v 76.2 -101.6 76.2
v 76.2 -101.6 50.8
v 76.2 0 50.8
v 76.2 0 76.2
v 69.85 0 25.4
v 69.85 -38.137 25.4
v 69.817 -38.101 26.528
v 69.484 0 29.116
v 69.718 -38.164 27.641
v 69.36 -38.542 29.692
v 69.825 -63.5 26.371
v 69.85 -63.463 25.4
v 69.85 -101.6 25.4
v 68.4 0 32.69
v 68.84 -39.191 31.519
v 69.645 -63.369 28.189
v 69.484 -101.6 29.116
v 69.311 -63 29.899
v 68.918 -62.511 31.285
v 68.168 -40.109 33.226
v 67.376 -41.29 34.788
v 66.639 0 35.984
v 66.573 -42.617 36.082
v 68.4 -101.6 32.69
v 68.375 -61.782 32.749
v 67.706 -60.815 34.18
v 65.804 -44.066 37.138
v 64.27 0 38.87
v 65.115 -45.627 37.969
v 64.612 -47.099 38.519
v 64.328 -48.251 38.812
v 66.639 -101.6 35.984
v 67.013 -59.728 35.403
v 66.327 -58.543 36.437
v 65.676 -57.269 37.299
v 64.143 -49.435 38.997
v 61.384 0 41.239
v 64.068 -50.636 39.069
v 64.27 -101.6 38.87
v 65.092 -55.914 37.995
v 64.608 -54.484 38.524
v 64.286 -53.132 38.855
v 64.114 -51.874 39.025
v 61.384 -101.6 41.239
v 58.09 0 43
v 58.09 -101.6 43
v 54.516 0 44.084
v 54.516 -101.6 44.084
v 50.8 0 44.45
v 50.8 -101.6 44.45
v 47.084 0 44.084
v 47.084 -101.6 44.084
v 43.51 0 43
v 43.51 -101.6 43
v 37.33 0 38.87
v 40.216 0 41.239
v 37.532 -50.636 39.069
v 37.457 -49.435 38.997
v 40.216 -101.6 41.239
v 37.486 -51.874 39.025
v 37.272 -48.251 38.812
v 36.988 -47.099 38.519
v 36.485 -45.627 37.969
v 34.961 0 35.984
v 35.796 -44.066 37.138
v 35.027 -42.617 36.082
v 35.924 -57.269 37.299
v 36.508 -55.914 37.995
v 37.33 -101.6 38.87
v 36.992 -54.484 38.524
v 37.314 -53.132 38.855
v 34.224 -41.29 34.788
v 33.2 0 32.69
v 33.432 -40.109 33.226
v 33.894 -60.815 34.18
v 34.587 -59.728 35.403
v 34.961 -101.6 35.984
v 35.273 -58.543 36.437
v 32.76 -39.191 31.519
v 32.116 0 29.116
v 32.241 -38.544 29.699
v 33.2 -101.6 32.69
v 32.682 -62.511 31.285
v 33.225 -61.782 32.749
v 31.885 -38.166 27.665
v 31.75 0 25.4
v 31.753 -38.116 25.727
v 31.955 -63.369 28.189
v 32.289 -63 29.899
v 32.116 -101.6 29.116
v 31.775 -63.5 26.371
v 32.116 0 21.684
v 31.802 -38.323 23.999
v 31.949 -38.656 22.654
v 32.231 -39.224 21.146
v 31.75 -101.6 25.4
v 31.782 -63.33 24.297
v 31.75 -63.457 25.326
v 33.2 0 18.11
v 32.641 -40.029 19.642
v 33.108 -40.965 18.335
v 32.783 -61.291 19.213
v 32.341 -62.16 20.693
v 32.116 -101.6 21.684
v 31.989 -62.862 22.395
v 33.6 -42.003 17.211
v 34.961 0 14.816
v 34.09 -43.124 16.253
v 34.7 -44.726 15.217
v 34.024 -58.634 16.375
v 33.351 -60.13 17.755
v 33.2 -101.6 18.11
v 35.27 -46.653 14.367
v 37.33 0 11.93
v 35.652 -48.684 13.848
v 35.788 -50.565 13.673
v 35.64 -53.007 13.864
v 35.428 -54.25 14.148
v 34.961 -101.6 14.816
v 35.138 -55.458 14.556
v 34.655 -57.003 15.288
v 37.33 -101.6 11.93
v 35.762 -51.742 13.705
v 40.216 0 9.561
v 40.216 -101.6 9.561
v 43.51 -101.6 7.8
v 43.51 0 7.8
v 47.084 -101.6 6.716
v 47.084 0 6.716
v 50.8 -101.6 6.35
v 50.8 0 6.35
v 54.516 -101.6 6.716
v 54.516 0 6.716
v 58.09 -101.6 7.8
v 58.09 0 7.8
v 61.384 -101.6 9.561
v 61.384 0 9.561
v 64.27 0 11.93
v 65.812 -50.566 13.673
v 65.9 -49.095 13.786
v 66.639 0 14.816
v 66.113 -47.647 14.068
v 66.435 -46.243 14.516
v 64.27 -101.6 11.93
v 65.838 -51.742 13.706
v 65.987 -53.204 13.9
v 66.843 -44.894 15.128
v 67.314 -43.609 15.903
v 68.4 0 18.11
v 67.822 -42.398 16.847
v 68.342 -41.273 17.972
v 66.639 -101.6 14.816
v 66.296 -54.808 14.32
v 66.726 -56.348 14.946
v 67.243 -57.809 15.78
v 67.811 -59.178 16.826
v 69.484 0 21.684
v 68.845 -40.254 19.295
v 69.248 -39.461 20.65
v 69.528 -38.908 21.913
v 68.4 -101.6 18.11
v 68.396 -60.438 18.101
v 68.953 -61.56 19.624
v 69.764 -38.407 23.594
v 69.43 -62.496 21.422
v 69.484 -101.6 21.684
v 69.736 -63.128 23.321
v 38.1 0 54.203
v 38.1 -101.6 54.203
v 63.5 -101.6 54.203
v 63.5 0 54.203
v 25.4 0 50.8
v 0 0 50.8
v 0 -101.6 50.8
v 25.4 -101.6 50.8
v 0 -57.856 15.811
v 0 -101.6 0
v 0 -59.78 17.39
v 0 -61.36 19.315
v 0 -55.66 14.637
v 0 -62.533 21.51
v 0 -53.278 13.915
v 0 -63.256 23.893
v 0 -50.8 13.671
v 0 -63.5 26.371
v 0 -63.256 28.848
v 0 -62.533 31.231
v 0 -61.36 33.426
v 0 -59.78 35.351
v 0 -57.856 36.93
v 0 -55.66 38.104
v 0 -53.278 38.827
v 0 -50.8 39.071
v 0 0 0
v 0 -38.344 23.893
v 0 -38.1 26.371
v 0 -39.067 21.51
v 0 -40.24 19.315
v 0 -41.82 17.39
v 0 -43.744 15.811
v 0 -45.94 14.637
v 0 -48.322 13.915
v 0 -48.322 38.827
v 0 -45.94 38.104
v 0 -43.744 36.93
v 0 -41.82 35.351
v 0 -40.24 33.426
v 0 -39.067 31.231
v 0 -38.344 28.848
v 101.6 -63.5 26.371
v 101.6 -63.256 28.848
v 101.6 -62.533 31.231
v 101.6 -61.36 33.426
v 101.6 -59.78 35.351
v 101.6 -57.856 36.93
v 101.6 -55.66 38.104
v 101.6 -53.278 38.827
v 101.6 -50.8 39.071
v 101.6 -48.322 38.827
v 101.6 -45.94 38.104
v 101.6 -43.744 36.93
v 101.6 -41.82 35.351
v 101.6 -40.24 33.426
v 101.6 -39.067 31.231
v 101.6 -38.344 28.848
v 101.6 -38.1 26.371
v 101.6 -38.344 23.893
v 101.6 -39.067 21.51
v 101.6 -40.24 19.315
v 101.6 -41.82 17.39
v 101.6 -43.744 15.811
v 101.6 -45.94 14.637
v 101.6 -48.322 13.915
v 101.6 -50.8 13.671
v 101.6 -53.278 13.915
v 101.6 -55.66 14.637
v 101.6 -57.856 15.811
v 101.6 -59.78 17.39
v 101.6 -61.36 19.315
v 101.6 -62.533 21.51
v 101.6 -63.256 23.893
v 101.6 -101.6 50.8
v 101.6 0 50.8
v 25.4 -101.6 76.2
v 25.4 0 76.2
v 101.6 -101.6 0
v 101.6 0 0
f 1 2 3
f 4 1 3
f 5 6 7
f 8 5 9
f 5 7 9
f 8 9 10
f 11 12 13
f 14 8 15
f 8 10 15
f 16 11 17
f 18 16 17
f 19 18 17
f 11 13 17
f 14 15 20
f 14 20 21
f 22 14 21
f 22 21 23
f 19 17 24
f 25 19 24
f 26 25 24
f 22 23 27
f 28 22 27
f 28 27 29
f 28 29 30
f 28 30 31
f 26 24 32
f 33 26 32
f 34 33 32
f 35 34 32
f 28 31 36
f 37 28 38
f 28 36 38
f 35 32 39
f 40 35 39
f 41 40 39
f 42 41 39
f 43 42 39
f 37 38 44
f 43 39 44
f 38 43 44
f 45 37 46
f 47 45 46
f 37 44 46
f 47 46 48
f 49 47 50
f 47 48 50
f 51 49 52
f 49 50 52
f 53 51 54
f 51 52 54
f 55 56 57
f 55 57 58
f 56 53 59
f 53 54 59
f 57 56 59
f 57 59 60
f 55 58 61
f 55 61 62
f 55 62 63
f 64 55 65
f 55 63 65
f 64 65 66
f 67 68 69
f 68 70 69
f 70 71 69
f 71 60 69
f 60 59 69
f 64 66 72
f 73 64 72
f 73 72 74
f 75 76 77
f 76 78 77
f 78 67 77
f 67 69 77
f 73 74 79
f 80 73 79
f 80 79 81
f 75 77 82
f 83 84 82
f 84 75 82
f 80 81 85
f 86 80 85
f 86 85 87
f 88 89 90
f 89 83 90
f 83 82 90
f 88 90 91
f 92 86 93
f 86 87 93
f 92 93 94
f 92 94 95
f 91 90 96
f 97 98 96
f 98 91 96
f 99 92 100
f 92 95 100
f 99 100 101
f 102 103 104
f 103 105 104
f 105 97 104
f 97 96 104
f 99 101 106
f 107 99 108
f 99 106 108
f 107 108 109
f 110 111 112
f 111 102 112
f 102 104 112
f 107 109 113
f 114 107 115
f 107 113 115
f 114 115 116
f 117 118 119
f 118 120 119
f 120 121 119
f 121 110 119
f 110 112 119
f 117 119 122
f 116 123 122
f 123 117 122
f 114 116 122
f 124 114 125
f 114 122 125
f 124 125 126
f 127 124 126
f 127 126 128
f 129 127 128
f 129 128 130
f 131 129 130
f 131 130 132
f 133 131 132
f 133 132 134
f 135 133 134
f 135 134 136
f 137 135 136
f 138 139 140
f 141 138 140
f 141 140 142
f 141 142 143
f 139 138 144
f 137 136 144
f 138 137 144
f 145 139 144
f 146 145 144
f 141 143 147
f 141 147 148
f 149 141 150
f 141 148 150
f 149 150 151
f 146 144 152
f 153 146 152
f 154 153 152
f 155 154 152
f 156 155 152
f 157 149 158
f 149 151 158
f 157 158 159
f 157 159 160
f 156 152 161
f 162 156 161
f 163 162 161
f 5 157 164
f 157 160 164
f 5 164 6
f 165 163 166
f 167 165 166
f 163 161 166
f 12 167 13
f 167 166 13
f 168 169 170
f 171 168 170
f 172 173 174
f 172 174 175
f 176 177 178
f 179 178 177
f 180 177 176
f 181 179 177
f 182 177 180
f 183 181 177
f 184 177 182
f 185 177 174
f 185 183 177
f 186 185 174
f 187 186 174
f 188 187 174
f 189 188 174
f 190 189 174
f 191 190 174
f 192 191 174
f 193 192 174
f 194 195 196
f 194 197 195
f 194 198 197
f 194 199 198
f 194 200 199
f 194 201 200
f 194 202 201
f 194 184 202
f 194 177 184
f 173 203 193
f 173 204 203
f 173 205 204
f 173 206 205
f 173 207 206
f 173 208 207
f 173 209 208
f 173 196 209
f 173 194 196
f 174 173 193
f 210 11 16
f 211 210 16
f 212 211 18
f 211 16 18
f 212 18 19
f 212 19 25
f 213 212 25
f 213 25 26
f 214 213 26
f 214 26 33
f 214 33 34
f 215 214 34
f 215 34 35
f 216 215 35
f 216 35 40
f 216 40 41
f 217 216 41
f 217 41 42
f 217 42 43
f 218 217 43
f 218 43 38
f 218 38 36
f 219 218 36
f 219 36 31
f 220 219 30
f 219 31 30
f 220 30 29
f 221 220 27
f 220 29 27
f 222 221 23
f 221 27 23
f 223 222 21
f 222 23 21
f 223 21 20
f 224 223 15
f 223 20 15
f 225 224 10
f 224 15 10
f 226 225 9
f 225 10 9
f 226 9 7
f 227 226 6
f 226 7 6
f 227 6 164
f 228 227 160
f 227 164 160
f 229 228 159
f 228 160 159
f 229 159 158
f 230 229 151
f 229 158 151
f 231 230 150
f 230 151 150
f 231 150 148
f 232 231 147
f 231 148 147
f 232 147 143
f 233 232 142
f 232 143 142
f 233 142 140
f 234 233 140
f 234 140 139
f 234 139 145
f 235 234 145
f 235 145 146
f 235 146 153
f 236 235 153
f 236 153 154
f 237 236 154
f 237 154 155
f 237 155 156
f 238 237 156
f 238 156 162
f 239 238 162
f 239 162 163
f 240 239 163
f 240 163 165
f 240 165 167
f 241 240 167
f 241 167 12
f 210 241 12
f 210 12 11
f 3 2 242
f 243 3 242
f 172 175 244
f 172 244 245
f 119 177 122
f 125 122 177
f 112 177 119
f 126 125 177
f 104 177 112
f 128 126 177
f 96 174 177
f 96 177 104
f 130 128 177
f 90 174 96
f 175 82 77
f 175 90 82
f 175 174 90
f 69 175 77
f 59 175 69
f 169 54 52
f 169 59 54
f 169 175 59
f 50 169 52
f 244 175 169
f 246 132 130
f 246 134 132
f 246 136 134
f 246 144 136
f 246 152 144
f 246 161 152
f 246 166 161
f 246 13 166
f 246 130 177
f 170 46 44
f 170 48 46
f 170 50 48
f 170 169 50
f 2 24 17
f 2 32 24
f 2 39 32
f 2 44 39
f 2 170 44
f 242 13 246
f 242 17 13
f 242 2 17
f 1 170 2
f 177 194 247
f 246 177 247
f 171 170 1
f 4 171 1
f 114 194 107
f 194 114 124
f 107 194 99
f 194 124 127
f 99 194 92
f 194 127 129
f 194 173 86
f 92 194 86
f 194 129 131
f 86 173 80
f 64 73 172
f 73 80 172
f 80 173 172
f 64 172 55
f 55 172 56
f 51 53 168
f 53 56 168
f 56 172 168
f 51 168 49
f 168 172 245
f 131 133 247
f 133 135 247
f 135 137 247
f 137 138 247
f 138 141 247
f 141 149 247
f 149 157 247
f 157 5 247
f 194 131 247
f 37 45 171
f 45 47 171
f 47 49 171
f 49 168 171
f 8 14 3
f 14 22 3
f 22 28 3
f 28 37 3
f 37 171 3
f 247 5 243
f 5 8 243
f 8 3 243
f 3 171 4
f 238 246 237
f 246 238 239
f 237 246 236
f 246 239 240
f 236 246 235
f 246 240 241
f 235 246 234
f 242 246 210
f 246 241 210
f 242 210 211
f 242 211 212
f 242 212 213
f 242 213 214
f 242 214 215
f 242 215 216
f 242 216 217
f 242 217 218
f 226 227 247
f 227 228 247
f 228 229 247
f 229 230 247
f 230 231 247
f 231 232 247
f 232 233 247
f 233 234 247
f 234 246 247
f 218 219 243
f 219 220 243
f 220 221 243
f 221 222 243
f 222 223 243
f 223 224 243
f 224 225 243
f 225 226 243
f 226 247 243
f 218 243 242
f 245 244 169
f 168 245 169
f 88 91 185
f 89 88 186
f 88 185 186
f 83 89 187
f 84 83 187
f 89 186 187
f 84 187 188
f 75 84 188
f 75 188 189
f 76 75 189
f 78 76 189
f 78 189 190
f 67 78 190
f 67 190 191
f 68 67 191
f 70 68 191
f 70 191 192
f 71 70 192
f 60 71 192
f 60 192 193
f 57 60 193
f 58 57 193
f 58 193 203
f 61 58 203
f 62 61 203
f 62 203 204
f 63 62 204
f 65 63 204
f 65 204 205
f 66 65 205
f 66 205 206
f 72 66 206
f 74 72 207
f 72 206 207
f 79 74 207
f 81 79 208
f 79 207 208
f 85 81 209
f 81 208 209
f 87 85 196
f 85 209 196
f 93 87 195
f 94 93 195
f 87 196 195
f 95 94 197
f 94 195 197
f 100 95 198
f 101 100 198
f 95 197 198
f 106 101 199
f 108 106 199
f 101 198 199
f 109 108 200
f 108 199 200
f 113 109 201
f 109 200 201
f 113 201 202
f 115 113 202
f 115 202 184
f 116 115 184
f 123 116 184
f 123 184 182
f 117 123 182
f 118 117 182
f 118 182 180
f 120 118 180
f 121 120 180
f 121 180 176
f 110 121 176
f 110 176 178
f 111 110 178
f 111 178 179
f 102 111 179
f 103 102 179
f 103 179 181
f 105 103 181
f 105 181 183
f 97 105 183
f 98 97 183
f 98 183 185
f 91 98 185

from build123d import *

# Parameters (mm, degrees)
F0_W     = 101.6
F0_H     = 50.8
F1_DEPTH = 101.6
F2_W     = 50.8
F2_H     = 101.6
F3_DEPTH = 25.4
F5_DEPTH = 101.6
F6_R     = 19.05
F7_DEPTH = 101.6
F8_R     = 12.7
F9_DEPTH = 101.6


with BuildPart() as f1:
    # F0 (on Front) → F1 (new body)
    with BuildSketch(Plane.XZ):
        with Locations((50.8, 25.4)):
            Rectangle(F0_W, F0_H)
    extrude(amount=F1_DEPTH)

    # F2 (on face) → F3 (join)
    with BuildSketch(Plane.XY.offset(50.8)):
        with Locations((50.8, -50.8)):
            Rectangle(F2_W, F2_H)
    extrude(amount=F3_DEPTH)

    # F4 (on face) → F5 (cut)
    with BuildSketch(Plane.XZ.offset(101.6)):
        Polygon((76.2, 76.2), (25.4, 76.2), (38.1, 54.202955), (63.5, 54.202955), align=None)
    extrude(amount=-F5_DEPTH, mode=Mode.SUBTRACT)

    # F6 (on face) → F7 (cut)
    with BuildSketch(Plane.XZ.offset(101.6)):
        with Locations((50.8, 25.4)):
            Circle(F6_R)
    extrude(amount=-F7_DEPTH, mode=Mode.SUBTRACT)

    # F8 (on face) → F9 (cut)
    with BuildSketch(Plane(origin=(0, 0, 0), x_dir=(0, -1, 0), z_dir=(-1, 0, 0))):
        with Locations((50.8, 26.370544)):
            Circle(F8_R)
    extrude(amount=-F9_DEPTH, mode=Mode.SUBTRACT)


solid = f1.part
